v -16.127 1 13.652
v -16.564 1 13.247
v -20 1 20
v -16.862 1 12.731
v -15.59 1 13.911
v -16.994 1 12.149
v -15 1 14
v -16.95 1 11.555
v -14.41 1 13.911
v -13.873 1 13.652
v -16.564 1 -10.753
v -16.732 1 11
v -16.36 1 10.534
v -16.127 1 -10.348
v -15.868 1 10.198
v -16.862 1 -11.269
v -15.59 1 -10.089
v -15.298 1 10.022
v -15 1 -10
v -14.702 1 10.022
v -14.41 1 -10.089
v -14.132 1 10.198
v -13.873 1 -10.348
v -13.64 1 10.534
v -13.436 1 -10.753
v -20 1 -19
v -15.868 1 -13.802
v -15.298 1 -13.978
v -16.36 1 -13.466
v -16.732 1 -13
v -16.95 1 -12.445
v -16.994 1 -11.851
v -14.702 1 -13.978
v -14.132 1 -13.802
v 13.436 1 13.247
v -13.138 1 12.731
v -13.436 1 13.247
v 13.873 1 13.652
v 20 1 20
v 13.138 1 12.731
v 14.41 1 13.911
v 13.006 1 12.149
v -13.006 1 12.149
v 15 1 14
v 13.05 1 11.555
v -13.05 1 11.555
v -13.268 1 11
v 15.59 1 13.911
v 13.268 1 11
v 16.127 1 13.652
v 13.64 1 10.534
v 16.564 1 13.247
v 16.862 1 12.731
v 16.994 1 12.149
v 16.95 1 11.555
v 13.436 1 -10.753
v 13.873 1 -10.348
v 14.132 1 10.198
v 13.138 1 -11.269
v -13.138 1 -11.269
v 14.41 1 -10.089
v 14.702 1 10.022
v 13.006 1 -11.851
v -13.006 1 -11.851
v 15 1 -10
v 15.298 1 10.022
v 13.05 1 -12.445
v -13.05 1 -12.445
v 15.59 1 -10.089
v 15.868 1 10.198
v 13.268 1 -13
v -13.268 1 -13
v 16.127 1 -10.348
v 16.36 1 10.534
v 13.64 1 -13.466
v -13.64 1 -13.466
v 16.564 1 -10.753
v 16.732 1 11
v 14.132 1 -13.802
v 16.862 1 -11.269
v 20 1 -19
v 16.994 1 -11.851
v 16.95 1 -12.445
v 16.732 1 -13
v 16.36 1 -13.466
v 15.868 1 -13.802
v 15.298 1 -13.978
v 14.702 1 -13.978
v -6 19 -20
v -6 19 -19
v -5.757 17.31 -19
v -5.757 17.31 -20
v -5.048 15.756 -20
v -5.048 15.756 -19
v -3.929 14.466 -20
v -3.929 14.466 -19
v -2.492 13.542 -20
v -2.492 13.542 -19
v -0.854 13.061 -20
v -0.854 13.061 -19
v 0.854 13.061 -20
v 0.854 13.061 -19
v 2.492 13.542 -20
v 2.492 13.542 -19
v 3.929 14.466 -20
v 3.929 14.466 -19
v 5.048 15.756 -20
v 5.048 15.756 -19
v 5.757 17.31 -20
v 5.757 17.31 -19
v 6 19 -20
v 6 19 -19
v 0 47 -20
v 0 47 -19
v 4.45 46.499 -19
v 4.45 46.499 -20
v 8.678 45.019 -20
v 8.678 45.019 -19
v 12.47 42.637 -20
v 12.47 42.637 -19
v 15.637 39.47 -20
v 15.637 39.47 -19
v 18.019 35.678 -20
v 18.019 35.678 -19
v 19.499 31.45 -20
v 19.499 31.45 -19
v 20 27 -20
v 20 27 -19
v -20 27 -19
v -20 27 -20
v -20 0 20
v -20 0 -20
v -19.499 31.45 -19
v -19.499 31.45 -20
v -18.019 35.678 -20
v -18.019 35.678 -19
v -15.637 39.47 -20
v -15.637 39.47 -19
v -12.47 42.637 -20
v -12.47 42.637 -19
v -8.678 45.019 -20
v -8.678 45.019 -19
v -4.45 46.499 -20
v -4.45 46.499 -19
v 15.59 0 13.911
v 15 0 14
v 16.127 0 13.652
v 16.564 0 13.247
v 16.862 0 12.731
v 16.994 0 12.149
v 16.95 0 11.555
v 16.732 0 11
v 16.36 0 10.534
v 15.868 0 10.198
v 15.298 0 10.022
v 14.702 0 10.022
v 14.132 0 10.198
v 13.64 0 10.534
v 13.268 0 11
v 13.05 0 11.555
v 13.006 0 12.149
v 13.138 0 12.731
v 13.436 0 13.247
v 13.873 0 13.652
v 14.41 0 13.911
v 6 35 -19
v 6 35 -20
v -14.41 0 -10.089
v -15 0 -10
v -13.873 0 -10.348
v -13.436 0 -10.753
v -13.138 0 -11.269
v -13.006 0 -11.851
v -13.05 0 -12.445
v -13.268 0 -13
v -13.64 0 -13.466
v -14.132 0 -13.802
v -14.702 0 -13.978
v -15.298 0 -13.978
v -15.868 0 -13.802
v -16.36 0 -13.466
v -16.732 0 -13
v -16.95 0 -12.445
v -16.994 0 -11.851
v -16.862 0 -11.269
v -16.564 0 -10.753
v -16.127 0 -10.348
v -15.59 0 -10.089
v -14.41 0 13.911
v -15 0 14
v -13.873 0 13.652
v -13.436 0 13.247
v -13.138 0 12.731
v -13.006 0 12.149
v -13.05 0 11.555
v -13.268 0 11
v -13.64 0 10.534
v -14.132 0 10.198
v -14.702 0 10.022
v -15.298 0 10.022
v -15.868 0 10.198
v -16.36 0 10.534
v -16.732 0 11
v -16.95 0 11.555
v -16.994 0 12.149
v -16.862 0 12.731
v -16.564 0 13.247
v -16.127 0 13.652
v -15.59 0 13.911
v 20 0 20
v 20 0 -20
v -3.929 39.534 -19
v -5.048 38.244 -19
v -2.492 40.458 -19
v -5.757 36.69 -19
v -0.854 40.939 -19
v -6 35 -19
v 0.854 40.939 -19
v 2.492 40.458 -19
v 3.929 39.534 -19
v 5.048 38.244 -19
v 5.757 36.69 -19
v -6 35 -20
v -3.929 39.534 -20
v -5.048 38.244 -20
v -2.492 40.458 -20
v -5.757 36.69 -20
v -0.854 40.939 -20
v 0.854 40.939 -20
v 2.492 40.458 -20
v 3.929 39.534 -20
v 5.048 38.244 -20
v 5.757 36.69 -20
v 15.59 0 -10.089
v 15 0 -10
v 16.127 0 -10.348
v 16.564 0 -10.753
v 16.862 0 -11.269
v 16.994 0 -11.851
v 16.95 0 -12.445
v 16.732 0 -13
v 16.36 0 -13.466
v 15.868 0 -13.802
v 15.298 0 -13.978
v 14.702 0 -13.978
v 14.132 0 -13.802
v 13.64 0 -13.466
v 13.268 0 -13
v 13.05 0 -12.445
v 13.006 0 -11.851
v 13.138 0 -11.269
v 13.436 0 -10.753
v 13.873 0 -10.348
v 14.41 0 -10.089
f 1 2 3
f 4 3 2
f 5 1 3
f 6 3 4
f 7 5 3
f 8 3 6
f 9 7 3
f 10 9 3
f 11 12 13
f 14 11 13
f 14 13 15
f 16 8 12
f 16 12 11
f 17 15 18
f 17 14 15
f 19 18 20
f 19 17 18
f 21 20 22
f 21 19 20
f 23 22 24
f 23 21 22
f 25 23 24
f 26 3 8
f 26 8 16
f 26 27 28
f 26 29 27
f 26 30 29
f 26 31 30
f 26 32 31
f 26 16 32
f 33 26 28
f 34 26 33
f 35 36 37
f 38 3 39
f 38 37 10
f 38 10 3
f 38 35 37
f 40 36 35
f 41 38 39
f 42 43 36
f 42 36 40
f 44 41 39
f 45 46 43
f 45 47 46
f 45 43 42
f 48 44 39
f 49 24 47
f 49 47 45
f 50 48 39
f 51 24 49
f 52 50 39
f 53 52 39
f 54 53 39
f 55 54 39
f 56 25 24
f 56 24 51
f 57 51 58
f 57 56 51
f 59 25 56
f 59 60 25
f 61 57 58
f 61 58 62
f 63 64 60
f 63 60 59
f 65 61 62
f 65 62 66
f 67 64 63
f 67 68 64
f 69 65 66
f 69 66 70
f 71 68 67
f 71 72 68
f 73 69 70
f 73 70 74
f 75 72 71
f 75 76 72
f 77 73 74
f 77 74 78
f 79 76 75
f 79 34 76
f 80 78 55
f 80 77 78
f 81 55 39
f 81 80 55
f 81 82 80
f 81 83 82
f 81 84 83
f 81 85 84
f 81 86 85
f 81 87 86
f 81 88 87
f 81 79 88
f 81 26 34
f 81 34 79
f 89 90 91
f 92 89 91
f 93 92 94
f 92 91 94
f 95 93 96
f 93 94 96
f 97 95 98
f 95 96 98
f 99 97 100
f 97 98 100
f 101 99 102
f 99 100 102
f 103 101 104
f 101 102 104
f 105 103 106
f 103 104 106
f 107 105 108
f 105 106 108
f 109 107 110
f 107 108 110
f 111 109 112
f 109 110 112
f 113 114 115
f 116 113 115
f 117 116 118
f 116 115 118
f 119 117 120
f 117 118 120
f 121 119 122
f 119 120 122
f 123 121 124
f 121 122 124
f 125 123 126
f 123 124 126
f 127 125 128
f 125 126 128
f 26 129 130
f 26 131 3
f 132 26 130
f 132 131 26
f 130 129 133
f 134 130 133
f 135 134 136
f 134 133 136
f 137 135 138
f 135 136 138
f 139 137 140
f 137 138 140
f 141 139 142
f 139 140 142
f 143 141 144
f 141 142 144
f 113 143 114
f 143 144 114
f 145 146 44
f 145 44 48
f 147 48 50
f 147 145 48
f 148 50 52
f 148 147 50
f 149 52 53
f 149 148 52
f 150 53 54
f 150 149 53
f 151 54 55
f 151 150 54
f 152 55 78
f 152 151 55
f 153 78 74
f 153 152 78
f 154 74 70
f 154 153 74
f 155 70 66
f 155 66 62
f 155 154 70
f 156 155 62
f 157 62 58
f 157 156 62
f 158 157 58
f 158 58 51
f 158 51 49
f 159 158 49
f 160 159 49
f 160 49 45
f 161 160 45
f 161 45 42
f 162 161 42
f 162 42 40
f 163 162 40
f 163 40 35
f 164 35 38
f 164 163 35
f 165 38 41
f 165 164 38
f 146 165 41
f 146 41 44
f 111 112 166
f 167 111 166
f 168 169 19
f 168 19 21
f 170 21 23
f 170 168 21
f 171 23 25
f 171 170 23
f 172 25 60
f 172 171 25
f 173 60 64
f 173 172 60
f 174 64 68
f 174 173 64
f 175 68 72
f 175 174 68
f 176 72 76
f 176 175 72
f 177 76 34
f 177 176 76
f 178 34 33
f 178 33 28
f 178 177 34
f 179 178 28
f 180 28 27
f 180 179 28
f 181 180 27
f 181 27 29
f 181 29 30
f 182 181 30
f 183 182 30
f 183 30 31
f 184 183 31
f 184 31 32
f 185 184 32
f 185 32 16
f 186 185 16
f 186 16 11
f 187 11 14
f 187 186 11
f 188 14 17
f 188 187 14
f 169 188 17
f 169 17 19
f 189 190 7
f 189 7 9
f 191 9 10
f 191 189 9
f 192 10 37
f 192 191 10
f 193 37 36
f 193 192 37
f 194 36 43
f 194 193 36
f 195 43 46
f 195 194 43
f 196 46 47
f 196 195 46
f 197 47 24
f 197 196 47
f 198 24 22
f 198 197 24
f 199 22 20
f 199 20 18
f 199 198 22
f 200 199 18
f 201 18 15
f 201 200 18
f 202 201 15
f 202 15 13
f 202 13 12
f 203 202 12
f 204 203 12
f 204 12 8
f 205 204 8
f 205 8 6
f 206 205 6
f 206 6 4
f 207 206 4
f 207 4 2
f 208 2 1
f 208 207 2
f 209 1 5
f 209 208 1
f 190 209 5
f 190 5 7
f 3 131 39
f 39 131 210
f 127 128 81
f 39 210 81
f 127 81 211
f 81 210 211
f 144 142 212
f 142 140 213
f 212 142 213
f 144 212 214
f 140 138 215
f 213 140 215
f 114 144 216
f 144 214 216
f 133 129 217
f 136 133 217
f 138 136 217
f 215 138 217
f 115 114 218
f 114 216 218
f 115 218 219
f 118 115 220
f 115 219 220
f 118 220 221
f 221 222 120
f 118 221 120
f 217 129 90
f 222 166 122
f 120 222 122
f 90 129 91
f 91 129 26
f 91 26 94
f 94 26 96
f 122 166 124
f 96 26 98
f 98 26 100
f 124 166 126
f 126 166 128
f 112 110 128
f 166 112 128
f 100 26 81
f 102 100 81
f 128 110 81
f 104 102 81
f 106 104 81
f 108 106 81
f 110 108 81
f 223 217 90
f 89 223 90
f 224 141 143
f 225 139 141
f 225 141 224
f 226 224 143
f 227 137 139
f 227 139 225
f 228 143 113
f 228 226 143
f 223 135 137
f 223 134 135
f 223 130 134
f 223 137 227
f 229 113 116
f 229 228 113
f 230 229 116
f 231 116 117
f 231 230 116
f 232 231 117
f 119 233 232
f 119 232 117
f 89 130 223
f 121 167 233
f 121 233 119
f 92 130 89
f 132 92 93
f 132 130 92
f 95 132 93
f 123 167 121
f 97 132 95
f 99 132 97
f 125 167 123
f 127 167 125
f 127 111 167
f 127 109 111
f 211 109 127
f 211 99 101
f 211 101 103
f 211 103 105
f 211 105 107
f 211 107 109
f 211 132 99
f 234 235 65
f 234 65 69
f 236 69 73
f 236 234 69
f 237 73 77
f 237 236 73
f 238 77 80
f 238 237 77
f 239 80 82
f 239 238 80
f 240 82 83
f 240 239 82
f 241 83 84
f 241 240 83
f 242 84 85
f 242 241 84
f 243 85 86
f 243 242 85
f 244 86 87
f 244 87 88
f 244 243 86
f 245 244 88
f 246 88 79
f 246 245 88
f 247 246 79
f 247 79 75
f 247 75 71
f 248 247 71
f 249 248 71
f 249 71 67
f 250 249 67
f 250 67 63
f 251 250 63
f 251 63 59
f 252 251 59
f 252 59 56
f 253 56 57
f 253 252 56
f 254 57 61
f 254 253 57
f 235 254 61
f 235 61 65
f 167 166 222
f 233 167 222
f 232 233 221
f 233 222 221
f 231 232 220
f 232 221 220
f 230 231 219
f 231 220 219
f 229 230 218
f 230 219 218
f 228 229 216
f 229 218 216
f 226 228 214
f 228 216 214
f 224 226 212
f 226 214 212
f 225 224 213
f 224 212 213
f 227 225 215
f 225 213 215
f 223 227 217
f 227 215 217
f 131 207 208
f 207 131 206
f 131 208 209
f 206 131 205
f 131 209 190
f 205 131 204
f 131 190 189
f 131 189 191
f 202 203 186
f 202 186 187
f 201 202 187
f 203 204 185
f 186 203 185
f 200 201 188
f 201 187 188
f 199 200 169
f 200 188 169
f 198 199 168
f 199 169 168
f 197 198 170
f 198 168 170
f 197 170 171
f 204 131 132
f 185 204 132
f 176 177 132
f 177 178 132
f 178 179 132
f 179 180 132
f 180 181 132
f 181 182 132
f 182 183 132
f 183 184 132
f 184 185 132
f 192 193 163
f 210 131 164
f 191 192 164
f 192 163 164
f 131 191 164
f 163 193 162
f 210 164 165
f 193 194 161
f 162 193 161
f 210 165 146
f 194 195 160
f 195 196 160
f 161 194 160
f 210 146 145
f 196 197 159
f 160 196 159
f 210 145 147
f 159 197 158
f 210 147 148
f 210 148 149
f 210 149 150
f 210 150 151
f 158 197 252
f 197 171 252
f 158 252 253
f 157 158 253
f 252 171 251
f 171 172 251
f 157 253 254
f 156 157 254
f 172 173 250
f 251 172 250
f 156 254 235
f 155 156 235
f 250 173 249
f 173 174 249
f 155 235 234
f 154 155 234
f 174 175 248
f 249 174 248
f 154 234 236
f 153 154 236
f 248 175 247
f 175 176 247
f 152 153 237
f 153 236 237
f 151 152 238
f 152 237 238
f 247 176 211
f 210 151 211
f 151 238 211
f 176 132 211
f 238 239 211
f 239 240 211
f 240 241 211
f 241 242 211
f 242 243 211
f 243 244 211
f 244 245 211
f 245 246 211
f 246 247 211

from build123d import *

# Parameters (mm, degrees)
SKETCH1_W           = 40
SKETCH1_H           = 40
SKETCH1_R           = 2
BOSS_EXTRUDE1_DEPTH = 1
SKETCH2_W           = 40
SKETCH2_H           = 1
BOSS_EXTRUDE2_DEPTH = 46
CUT_EXTRUDE1_DEPTH  = 46


with BuildPart() as part:
    # Sketch1 → Boss-Extrude1 (new body)
    with BuildSketch(Plane(origin=(0, 0, 0), x_dir=(1, 0, 0), z_dir=(0, 1, 0))):
        Rectangle(SKETCH1_W, SKETCH1_H)
        with Locations(Location((-15, -12, 0), (0, 0, 270))):
            Circle(SKETCH1_R, mode=Mode.SUBTRACT)
        with Locations(Location((15, -12, 0), (0, 0, 270))):
            Circle(SKETCH1_R, mode=Mode.SUBTRACT)
        with Locations(Location((15, 12, 0), (0, 0, 270))):
            Circle(SKETCH1_R, mode=Mode.SUBTRACT)
        with Locations(Location((-15, 12, 0), (0, 0, 270))):
            Circle(SKETCH1_R, mode=Mode.SUBTRACT)
    extrude(amount=BOSS_EXTRUDE1_DEPTH)

    # Sketch2 → Boss-Extrude2 (add)
    with BuildSketch(Plane(origin=(0, 1, 0), x_dir=(1, 0, 0), z_dir=(0, 1, 0))):
        with Locations((0, 19.5)):
            Rectangle(SKETCH2_W, SKETCH2_H)
    extrude(amount=BOSS_EXTRUDE2_DEPTH)

    # Sketch3 → Cut-Extrude1 (cut)
    with BuildSketch(Plane.XY.offset(-19)):
        with BuildLine():
            Line((6, 19), (6, 35))
            ThreePointArc((6, 35), (0, 41), (-6, 35))
            Line((-6, 35), (-6, 19))
            ThreePointArc((-6, 19), (0, 13), (6, 19))
        make_face()
        with BuildLine():
            Line((-20, 47), (-20, 27))
            ThreePointArc((-20, 27), (-14.142135559, 41.142135688), (1.83e-07, 47))
            Line((1.83e-07, 47), (-20, 47))
        make_face()
        with BuildLine():
            ThreePointArc((1.83e-07, 47), (14.142135688, 41.142135559), (20, 27))
            Line((20, 27), (20, 47))
            Line((20, 47), (1.83e-07, 47))
        make_face()
    extrude(amount=-CUT_EXTRUDE1_DEPTH, mode=Mode.SUBTRACT)


solid = part.part
